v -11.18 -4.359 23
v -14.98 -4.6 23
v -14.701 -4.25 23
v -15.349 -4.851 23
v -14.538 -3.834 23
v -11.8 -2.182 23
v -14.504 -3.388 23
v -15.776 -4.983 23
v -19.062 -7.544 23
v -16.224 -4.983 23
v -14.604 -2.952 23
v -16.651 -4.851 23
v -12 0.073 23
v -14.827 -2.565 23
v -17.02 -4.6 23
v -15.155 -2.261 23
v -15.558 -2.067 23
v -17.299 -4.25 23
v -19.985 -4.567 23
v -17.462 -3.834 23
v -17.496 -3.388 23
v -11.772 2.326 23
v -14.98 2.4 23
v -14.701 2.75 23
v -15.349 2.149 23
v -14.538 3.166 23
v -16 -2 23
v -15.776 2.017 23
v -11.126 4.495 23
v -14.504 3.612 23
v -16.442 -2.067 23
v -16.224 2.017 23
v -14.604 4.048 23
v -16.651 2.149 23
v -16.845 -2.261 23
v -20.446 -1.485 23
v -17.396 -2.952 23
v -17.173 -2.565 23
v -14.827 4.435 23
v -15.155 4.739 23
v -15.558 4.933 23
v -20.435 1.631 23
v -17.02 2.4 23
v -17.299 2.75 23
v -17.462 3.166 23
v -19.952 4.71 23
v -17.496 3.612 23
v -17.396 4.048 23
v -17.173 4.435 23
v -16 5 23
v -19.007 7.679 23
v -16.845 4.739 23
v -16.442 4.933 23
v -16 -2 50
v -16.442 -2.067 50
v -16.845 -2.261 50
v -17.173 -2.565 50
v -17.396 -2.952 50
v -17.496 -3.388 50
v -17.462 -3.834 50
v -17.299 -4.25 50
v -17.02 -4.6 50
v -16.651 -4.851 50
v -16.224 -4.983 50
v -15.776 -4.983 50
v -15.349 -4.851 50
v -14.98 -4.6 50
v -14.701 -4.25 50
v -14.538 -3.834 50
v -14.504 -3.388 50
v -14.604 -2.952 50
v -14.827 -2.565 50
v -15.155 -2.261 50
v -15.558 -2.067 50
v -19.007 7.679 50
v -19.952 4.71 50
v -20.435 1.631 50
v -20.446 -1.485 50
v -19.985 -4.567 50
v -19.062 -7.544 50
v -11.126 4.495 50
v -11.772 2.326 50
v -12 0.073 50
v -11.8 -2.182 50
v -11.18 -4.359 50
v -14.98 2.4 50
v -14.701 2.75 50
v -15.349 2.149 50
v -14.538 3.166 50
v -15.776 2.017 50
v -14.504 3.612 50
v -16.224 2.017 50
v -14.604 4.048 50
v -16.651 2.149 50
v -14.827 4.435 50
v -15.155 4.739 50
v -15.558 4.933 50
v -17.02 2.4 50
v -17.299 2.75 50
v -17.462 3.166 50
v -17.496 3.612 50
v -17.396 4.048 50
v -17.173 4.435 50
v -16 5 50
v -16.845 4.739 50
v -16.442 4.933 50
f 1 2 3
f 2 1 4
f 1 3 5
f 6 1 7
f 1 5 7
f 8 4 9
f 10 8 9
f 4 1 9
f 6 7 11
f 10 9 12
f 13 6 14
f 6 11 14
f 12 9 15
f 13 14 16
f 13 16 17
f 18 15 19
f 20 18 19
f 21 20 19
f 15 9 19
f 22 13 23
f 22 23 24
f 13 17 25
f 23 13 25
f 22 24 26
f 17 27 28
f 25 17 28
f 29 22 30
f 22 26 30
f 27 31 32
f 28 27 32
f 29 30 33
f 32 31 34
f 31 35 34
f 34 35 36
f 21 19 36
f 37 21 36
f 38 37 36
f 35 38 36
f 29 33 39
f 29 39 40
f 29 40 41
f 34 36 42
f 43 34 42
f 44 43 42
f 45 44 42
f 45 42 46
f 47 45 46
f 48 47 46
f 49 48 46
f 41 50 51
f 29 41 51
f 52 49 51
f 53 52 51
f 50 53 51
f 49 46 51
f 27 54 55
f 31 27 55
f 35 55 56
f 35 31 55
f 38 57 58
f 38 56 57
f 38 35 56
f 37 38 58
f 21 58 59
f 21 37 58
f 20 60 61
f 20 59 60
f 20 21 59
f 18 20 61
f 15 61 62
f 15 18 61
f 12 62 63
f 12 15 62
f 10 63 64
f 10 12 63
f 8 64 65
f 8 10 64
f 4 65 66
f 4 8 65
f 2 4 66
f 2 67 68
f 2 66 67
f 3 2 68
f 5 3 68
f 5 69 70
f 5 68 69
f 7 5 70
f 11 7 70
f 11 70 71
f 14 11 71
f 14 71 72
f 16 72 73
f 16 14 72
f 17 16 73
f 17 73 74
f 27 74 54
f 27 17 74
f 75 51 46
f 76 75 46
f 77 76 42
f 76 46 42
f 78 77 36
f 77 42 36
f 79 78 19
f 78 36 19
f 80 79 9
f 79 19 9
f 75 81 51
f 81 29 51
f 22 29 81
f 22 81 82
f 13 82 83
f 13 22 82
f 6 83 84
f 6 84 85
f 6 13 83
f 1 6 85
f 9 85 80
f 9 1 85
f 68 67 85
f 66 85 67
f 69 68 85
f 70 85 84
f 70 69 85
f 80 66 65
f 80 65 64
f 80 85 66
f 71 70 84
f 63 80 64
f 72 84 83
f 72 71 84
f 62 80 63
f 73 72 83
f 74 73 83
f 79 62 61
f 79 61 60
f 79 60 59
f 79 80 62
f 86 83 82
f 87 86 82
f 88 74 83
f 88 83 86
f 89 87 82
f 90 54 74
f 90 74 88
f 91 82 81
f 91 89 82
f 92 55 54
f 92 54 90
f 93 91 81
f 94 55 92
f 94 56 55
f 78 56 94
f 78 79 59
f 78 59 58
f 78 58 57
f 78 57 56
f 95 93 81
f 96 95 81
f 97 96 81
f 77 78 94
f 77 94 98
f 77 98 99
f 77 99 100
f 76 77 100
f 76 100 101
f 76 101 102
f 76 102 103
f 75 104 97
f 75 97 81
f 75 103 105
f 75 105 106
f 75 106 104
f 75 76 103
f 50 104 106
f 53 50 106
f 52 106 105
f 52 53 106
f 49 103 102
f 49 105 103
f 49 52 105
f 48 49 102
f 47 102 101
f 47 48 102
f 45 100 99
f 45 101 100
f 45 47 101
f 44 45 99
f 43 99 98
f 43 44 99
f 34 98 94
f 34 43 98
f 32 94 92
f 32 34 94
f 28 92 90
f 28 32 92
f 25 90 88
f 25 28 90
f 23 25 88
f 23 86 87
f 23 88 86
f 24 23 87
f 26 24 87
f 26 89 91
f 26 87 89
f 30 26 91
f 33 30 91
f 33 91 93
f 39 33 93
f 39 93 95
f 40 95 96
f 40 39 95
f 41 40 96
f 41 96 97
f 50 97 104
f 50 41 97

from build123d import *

# Parameters (mm, degrees)
CYLINDER860_R          = 1.5
CYLINDER860_DEPTH      = 60
CYLINDER859_R          = 1.5
CYLINDER859_DEPTH      = 60
BOX336_W               = 20
BOX336_H               = 40
BOX336_DEPTH           = 60
BOX336_PLACEMENT_ANGLE = 22
BOX410_W               = 20
BOX410_H               = 40
BOX410_DEPTH           = 60
BOX410_PLACEMENT_ANGLE = 22
BOX335_W               = 60
BOX335_H               = 40
BOX335_DEPTH           = 60
TUBE037_R              = 20.5
TUBE037_R_2            = 12
TUBE037_DEPTH          = 27
CUT469_PLACEMENT_ANGLE = 90


with BuildPart() as v_lec860:
    # Cylinder860 → Cylinder860 (new body)
    with BuildSketch(Plane(origin=(-3.5, 16, 0), x_dir=(1, 0, 0), z_dir=(0, 0, 1))):
        Circle(CYLINDER860_R)
    extrude(amount=CYLINDER860_DEPTH)


with BuildPart() as compound565:
    # Cylinder859 → Cylinder859 (new body)
    with BuildSketch(Plane(origin=(3.5, 16, 0), x_dir=(1, 0, 0), z_dir=(0, 0, 1))):
        Circle(CYLINDER859_R)
    extrude(amount=CYLINDER859_DEPTH)

    # Compound565: union Válec860
    add(v_lec860.part)


with BuildPart() as krychle336:
    # Box336 → Box336 (new body)
    with BuildSketch(Plane.XY):
        with Locations((10, 20)):
            Rectangle(BOX336_W, BOX336_H)
    extrude(amount=BOX336_DEPTH)


with BuildPart() as krychle336_1:
    # Box336 placement: moved
    add(krychle336.part.rotate(Axis((0, 0, 0), (0, 0, -1)), BOX336_PLACEMENT_ANGLE))


with BuildPart() as krychle410:
    # Box410 → Box410 (new body)
    with BuildSketch(Plane.XY):
        with Locations((10, 20)):
            Rectangle(BOX410_W, BOX410_H)
    extrude(amount=BOX410_DEPTH)


with BuildPart() as krychle410_1:
    # Box410 placement: moved
    add(krychle410.part.moved(Location((-19.32, -5.18, 0))).rotate(Axis((-19.32, -5.18, 0), (0, 0, 1)), BOX410_PLACEMENT_ANGLE))


with BuildPart() as krychle335:
    # Box335 → Box335 (new body)
    with BuildSketch(Plane(origin=(-30, -35, 0), x_dir=(1, 0, 0), z_dir=(0, 0, 1))):
        with Locations((30, 20)):
            Rectangle(BOX335_W, BOX335_H)
    extrude(amount=BOX335_DEPTH)


with BuildPart() as cut469:
    # Tube037 → Tube037 (new body)
    with BuildSketch(Plane.XY.offset(23)):
        Circle(TUBE037_R)
        Circle(TUBE037_R_2, mode=Mode.SUBTRACT)
    extrude(amount=TUBE037_DEPTH)

    # Cut355: cut Krychle335
    add(krychle335.part, mode=Mode.SUBTRACT)

    # Cut357: cut Krychle410
    add(krychle410_1.part, mode=Mode.SUBTRACT)

    # Cut358: cut Krychle336
    add(krychle336_1.part, mode=Mode.SUBTRACT)

    # Cut469: cut Compound565
    add(compound565.part, mode=Mode.SUBTRACT)


with BuildPart() as cut469_1:
    # Cut469 placement: moved
    add(cut469.part.rotate(Axis((0, 0, 0), (0, 0, 1)), CUT469_PLACEMENT_ANGLE))


solid = cut469_1.part
